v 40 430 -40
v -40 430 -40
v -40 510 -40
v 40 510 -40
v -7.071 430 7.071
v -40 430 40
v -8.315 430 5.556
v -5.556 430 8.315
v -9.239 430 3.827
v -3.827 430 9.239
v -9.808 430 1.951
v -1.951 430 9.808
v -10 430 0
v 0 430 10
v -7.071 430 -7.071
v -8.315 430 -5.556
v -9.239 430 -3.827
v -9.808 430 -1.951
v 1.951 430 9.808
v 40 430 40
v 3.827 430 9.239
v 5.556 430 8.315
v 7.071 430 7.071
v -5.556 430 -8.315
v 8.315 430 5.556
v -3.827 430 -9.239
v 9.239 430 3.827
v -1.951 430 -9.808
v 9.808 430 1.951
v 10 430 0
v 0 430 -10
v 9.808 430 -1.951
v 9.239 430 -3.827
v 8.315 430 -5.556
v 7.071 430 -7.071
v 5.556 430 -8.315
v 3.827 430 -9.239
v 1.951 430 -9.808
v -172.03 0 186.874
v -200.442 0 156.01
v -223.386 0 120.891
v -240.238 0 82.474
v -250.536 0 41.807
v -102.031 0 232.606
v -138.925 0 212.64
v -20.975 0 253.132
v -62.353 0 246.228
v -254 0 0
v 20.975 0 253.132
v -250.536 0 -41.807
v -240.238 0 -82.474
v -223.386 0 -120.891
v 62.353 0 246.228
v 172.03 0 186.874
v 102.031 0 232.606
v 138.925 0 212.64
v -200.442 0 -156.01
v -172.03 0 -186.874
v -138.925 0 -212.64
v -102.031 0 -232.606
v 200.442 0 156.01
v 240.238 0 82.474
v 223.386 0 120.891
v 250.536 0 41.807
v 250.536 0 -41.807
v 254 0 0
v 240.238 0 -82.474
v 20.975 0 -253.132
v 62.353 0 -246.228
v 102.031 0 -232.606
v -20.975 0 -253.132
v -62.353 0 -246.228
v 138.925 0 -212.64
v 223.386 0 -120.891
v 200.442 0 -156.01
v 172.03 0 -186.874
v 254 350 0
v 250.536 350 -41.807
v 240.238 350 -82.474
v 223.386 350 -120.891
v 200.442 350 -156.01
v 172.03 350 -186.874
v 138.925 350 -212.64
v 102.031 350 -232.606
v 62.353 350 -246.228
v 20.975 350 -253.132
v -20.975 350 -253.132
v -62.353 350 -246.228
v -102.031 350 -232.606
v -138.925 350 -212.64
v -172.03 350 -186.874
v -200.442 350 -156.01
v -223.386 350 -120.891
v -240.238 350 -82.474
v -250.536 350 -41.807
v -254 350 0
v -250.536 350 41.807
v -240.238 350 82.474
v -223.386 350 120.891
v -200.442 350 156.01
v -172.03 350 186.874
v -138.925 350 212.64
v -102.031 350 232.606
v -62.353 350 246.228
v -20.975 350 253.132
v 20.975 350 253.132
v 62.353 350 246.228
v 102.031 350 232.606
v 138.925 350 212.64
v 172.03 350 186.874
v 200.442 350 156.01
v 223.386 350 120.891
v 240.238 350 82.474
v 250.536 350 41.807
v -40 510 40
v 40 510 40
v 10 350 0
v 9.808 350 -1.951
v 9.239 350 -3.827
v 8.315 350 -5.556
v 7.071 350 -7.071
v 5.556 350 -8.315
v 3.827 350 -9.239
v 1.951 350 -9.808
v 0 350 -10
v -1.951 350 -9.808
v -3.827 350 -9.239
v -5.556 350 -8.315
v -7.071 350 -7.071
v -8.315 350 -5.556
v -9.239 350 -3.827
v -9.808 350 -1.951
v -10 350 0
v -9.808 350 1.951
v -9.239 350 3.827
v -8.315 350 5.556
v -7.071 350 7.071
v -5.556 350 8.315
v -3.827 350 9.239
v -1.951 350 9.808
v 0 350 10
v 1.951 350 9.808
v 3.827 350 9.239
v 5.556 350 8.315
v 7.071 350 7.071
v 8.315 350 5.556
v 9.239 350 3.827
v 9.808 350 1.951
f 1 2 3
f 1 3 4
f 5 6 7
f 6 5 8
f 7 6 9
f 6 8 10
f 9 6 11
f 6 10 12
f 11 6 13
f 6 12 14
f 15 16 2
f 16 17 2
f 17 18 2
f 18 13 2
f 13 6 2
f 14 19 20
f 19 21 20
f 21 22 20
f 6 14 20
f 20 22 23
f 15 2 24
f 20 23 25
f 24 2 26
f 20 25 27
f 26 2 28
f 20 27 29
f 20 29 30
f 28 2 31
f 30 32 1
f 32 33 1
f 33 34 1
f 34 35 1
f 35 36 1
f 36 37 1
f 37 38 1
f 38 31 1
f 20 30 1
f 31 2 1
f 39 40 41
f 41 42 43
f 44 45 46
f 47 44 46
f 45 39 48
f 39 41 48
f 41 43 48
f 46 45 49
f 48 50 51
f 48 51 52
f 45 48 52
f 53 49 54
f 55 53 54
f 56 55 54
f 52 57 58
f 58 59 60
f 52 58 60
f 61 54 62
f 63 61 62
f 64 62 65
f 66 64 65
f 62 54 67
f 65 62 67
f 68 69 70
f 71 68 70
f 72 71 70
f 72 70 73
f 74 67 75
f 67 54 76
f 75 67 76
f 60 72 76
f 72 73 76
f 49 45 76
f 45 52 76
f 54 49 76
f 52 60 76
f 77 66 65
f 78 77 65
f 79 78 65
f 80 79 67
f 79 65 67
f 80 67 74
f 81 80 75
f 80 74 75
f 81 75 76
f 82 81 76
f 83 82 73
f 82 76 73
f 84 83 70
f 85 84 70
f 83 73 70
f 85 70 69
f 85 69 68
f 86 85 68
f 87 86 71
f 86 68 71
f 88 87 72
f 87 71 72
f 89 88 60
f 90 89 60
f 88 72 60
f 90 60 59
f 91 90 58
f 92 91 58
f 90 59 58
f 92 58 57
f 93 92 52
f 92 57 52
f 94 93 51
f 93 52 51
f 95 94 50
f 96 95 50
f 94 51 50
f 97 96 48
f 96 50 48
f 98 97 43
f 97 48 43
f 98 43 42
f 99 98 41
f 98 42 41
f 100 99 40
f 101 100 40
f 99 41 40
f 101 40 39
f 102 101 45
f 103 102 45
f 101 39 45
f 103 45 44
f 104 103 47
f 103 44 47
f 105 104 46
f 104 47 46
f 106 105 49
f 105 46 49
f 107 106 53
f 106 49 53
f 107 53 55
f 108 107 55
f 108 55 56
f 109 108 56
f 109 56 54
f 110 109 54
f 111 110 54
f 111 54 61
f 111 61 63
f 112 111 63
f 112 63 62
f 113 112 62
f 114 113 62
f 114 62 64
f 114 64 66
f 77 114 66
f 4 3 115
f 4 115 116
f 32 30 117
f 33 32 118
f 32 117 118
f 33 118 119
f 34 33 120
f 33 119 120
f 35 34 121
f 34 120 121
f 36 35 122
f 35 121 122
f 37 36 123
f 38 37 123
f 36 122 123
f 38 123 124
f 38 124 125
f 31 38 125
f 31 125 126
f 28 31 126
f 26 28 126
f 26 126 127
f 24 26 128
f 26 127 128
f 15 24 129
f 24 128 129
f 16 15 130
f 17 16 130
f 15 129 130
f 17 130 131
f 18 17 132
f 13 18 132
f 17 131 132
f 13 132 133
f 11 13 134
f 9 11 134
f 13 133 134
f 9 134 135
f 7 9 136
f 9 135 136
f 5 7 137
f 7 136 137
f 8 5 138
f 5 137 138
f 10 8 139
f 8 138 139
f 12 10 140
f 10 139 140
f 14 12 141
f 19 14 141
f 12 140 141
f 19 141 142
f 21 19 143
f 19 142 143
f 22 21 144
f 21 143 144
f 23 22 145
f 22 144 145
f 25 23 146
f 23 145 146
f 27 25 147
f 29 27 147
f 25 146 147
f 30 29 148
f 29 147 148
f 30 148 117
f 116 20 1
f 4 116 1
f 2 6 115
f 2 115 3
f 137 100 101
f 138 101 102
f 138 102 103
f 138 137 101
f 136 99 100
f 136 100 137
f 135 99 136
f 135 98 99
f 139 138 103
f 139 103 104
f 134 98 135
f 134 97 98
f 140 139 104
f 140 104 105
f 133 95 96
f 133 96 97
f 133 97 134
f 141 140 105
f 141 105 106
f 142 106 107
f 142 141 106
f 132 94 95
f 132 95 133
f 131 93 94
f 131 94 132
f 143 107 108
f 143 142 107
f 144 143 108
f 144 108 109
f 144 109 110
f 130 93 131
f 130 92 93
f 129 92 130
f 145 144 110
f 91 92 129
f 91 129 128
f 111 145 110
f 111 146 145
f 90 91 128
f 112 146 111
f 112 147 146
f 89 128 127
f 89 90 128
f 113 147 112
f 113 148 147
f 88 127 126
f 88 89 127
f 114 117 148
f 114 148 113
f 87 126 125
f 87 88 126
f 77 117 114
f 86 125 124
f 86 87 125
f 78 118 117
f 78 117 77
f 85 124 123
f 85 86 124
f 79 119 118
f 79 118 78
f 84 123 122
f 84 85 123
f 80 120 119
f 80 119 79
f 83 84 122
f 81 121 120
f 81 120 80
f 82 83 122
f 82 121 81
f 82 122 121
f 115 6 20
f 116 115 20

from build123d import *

# Parameters (mm, degrees)
ESQUISSE1_R      = 254
EXTRUSION1_DEPTH = 350
ESQUISSE2_R      = 10
EXTRUSION2_DEPTH = 80
ESQUISSE3_W      = 80
ESQUISSE3_H      = 80
EXTRUSION3_DEPTH = 80


with BuildPart() as part:
    # Esquisse1 → Extrusion1 (new body)
    with BuildSketch(Plane(origin=(0, 0, 0), x_dir=(1, 0, 0), z_dir=(0, 1, 0))):
        Circle(ESQUISSE1_R)
    extrude(amount=EXTRUSION1_DEPTH)

    # Esquisse2 → Extrusion2 (add)
    with BuildSketch(Plane(origin=(0, 350, 0), x_dir=(1, 0, 0), z_dir=(0, 1, 0))):
        Circle(ESQUISSE2_R)
    extrude(amount=EXTRUSION2_DEPTH)

    # Esquisse3 → Extrusion3 (add)
    with BuildSketch(Plane(origin=(0, 430, 0), x_dir=(1, 0, 0), z_dir=(0, 1, 0))):
        Rectangle(ESQUISSE3_W, ESQUISSE3_H)
    extrude(amount=EXTRUSION3_DEPTH)


solid = part.part
